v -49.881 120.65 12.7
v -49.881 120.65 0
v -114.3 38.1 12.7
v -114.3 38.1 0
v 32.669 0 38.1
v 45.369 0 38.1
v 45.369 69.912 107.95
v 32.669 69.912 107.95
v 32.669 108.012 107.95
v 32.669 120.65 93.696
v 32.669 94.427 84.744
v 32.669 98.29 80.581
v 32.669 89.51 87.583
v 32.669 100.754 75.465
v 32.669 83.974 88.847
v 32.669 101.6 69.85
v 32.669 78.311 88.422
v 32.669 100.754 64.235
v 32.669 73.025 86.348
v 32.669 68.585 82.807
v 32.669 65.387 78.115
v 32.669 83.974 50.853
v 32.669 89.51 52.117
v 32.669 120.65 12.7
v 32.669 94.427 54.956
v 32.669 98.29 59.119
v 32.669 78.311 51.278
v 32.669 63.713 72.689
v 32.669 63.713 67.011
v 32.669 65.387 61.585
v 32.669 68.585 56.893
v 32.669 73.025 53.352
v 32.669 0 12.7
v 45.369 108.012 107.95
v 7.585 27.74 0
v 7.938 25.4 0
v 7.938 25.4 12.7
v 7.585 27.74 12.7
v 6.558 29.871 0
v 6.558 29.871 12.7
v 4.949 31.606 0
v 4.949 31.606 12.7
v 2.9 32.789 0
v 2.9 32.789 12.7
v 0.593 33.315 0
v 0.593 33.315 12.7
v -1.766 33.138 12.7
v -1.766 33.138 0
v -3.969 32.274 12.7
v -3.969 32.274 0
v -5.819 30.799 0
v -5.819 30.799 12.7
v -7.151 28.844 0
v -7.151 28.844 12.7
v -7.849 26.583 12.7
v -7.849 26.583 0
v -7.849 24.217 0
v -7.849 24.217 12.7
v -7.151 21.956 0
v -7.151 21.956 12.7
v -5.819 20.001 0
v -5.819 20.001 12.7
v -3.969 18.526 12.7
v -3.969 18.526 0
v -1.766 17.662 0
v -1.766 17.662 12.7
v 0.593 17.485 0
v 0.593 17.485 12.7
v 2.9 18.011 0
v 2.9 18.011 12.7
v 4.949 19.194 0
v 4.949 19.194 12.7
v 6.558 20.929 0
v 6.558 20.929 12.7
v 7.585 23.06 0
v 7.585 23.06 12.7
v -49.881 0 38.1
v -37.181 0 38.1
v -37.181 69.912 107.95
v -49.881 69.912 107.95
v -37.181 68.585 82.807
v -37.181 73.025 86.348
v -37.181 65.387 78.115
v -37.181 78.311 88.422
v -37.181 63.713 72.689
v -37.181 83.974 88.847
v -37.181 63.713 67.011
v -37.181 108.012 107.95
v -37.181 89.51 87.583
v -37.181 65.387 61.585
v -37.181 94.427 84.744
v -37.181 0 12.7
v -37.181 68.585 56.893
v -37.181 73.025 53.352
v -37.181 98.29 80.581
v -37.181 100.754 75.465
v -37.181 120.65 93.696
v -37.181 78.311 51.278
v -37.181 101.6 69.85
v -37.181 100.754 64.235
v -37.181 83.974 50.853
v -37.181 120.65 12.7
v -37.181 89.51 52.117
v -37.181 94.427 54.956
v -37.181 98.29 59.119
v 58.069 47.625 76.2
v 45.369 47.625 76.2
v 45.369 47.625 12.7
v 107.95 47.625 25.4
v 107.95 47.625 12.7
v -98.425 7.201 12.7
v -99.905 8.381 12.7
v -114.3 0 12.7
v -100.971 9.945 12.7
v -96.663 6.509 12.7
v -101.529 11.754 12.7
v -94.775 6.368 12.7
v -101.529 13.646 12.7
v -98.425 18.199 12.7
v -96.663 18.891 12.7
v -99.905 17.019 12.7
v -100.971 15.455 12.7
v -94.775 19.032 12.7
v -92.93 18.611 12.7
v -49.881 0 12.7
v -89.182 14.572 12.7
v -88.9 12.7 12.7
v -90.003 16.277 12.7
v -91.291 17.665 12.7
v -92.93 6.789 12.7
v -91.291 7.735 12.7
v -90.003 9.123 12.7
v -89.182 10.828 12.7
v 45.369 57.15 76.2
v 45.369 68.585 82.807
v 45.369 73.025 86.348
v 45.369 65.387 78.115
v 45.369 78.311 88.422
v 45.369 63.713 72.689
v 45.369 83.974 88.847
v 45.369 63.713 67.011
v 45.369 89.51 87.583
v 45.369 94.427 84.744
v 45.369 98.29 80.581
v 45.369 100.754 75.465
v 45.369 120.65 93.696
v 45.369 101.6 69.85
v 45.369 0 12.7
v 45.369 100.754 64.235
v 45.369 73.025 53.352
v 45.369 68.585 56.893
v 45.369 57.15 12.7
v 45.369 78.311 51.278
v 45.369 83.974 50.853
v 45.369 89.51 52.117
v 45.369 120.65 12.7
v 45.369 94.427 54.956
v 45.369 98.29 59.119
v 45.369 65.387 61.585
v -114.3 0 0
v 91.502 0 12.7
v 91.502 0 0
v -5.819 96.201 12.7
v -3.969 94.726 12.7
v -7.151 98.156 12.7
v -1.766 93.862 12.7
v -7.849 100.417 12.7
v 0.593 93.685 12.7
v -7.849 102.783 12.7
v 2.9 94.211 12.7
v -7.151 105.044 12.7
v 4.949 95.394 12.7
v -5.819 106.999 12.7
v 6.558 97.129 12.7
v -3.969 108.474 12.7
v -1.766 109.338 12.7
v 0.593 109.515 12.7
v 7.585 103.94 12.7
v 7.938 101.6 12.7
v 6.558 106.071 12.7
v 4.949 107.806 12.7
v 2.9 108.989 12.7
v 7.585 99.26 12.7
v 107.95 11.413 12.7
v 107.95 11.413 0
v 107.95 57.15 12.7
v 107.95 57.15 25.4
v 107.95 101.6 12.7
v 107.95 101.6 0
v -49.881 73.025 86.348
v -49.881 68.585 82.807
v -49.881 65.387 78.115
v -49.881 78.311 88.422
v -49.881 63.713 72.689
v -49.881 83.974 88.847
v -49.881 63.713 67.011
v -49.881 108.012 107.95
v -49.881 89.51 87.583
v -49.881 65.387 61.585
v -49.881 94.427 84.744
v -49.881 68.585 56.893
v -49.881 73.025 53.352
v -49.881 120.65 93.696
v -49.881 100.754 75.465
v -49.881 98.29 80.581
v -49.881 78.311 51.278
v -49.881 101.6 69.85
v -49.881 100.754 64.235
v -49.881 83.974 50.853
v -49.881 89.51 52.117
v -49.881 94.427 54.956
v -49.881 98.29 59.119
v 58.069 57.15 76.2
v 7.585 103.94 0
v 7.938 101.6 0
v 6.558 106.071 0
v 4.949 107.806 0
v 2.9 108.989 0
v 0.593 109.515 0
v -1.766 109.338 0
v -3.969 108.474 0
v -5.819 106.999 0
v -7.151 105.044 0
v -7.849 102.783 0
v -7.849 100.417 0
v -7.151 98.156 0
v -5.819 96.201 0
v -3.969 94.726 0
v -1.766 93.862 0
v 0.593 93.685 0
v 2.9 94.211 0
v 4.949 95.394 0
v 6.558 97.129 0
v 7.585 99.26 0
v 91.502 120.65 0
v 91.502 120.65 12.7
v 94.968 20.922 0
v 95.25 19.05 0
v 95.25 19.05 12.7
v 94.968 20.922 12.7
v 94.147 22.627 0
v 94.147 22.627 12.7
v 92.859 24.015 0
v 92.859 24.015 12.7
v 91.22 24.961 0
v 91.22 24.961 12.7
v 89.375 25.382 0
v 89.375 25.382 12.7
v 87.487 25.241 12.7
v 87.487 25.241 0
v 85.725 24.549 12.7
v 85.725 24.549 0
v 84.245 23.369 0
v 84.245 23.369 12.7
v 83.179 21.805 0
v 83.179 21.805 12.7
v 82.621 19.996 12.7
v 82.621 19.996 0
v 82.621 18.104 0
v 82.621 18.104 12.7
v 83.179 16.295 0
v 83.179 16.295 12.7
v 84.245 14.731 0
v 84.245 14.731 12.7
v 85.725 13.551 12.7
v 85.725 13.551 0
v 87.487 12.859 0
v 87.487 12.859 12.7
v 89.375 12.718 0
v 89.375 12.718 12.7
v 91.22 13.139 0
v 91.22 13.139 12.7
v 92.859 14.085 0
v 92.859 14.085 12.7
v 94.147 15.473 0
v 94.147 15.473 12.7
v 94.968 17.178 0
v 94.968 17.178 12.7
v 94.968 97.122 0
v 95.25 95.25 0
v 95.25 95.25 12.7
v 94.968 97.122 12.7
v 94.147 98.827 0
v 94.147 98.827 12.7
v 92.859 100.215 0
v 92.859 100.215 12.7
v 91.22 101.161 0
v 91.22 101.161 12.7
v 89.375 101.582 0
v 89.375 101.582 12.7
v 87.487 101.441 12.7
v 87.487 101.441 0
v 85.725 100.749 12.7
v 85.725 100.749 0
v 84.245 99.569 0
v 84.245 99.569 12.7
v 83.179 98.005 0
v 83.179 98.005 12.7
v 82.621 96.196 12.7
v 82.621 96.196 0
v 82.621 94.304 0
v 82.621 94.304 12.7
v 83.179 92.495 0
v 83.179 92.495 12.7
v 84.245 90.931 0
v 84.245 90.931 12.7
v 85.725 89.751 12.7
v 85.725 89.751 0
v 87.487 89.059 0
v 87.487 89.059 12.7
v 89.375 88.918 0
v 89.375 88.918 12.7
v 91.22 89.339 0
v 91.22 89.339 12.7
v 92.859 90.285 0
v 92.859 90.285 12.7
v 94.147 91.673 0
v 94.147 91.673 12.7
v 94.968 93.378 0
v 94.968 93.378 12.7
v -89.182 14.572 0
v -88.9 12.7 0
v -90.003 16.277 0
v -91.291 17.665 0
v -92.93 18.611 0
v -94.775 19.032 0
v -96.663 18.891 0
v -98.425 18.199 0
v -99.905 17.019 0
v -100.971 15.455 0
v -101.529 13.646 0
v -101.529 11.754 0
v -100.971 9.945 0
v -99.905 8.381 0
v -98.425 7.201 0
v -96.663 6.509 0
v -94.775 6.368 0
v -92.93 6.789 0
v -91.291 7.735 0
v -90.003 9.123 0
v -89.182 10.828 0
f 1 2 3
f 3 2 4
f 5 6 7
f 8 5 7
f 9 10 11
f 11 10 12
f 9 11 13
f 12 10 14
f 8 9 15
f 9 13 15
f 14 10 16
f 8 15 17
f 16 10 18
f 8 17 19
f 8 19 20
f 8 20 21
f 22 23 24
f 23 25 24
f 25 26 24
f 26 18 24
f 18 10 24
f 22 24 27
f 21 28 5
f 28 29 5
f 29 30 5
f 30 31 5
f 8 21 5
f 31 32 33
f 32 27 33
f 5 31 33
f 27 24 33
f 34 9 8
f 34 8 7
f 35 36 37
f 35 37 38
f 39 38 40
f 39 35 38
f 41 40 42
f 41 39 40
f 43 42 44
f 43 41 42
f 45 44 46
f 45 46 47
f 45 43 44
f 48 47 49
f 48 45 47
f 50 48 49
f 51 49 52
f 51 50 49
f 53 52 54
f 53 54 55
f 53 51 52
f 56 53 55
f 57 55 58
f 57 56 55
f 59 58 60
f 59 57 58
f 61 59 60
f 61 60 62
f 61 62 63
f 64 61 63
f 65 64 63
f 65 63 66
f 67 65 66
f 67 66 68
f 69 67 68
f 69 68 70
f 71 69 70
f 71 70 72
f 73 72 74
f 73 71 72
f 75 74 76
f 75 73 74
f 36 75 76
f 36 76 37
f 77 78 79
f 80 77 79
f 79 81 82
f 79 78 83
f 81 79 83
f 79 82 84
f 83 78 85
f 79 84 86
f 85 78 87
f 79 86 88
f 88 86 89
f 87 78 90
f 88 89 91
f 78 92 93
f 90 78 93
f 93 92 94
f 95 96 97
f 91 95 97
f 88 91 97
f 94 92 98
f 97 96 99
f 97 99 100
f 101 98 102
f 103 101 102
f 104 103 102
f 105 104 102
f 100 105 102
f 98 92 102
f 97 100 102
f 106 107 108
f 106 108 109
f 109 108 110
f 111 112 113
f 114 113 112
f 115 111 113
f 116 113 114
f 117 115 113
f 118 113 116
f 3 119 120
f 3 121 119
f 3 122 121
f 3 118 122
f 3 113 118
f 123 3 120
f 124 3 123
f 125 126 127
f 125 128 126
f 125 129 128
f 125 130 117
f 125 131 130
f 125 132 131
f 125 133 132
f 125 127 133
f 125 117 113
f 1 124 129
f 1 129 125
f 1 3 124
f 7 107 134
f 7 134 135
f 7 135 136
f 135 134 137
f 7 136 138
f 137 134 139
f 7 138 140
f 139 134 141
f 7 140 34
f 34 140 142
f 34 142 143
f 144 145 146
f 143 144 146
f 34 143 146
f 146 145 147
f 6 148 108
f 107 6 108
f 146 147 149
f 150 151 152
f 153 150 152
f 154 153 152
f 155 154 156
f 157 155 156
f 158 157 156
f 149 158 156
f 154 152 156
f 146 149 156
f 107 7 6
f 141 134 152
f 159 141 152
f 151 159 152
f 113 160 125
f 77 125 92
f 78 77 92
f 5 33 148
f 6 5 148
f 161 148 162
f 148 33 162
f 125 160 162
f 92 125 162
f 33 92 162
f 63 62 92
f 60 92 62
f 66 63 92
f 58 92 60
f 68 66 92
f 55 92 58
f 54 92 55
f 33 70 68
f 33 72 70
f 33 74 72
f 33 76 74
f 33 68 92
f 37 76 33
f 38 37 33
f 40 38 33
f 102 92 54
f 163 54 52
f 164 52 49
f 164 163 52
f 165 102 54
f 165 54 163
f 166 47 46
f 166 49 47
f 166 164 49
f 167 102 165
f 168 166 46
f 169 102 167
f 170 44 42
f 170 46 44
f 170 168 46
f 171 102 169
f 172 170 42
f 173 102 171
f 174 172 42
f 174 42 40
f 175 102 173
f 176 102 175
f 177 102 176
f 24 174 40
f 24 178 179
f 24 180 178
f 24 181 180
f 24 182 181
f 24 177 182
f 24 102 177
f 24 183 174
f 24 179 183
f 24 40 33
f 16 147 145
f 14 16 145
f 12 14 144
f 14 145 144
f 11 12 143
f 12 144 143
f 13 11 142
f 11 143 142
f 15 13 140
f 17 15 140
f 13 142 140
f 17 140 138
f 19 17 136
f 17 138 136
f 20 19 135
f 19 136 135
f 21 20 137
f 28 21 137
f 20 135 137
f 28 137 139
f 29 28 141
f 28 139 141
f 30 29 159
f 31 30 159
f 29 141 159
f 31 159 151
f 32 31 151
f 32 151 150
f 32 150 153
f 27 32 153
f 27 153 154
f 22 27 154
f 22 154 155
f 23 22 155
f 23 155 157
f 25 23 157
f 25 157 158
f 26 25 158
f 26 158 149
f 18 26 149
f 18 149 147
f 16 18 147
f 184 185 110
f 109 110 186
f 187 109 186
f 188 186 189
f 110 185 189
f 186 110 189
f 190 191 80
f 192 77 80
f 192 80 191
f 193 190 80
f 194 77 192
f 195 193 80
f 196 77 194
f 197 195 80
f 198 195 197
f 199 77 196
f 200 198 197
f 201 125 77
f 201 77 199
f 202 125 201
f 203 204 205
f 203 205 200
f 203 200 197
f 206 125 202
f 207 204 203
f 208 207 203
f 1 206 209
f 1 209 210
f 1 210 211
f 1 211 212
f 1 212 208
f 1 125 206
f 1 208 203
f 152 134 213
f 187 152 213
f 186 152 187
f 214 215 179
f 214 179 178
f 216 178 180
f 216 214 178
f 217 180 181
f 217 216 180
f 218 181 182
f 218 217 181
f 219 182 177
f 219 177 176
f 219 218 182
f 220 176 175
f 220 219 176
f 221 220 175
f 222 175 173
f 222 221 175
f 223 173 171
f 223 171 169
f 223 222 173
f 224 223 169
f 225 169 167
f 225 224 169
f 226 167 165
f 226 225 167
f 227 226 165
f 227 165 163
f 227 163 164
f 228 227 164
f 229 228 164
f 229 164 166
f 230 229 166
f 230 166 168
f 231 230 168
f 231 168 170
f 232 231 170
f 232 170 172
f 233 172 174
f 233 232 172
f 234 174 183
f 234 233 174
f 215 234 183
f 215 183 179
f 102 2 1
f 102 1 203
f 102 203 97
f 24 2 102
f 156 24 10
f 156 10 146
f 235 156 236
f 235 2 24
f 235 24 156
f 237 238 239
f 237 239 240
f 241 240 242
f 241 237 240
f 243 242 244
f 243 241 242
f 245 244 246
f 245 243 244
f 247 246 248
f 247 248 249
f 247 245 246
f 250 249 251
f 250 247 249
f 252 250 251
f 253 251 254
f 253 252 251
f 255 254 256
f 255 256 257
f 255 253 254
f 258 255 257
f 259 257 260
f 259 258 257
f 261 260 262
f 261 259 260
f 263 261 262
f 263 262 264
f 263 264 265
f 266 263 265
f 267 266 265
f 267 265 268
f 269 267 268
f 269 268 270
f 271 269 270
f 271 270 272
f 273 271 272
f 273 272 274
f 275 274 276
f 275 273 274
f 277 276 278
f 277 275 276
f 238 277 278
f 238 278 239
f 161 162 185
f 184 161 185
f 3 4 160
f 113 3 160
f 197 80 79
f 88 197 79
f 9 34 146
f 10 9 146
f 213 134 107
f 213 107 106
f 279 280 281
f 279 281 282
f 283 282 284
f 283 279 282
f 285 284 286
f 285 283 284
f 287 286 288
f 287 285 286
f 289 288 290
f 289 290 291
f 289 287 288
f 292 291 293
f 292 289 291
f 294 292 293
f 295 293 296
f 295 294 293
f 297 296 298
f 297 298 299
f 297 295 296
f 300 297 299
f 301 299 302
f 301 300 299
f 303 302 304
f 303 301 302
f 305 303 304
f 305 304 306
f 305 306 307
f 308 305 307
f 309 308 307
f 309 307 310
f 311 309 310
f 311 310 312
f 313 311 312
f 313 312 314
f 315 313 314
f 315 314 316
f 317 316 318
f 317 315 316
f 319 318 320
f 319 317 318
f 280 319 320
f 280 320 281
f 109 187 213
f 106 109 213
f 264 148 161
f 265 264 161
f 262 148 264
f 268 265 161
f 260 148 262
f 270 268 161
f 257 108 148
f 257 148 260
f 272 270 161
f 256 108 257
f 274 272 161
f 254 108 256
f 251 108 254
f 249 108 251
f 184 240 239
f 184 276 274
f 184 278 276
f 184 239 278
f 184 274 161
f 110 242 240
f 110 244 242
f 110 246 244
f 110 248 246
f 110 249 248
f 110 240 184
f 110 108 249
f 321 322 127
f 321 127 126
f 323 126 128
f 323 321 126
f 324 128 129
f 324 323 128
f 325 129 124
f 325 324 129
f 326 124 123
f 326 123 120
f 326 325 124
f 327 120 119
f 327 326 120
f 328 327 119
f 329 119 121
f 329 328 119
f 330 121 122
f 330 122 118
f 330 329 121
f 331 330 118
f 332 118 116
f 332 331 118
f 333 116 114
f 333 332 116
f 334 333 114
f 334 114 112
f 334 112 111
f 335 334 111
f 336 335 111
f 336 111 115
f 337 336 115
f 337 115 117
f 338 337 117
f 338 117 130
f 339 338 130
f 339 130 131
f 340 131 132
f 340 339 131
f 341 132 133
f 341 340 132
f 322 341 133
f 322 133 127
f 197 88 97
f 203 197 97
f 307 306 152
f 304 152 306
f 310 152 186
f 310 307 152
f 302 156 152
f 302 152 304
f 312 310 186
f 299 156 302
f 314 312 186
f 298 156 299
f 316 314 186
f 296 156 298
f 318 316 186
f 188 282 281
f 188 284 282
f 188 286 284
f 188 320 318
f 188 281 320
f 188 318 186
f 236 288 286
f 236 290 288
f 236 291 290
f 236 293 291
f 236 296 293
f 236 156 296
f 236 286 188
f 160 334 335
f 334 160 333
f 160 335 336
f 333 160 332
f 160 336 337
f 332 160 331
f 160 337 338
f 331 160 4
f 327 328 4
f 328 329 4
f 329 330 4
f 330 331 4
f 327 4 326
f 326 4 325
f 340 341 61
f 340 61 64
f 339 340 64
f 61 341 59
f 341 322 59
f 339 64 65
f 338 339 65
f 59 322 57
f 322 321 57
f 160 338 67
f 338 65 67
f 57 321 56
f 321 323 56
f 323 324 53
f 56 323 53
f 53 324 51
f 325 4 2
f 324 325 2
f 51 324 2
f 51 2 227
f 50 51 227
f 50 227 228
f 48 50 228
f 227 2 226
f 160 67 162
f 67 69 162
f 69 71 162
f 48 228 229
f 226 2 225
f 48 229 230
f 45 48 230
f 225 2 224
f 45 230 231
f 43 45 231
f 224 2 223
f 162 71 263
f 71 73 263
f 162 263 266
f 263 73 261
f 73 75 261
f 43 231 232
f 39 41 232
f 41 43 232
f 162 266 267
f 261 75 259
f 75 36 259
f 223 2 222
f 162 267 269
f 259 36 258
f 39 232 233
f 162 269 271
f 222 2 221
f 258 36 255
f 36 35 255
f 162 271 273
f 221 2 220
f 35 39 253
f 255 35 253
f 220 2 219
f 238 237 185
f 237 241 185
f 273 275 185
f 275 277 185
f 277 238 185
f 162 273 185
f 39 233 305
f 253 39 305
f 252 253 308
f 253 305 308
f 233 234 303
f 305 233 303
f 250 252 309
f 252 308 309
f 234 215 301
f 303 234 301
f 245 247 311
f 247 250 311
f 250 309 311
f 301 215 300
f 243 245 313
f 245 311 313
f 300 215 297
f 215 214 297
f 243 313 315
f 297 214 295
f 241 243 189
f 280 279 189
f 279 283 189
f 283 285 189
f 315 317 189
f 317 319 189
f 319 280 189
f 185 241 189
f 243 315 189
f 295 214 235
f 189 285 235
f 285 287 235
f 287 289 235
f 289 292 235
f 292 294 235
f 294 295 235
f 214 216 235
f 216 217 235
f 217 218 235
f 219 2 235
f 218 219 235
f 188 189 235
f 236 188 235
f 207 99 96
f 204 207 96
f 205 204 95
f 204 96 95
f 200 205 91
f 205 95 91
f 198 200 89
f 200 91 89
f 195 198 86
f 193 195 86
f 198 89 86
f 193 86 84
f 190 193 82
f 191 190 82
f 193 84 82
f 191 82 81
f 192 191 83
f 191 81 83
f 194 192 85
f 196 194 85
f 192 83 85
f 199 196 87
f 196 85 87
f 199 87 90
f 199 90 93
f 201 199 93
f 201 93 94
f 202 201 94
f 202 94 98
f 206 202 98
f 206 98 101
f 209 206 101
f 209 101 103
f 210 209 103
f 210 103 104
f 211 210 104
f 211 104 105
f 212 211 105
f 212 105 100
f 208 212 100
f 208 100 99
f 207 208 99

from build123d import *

# Parameters (mm, degrees)
F0_R     = 6.35
F1_DEPTH = 12.7
F0_W     = 69.85
F0_H     = 120.65
F0_R_2   = 7.9375
F0_W_2   = 12.7
F2_DEPTH = 107.95
F0_W_3   = 62.5805897668
F0_H_2   = 9.525
F3_DEPTH = 76.2
F5_DEPTH = 25.4
F6_R     = 19.05
F7_DEPTH = 159.6704102332


with BuildPart() as f1:
    # F0 (on Top) → F1 (new body)
    with BuildSketch(Plane.XY):
        Polygon((91.5022938823, 120.65), (45.3694102332, 120.65), (45.3694102332, 57.15), (107.95, 57.15), (107.95, 101.6), align=None)
        with Locations((88.9, 95.25)):
            Circle(F0_R, mode=Mode.SUBTRACT)
    extrude(amount=F1_DEPTH)



with BuildPart() as f1b:
    # F0 (on Top) → F1, piece 2 (new body)
    with BuildSketch(Plane.XY):
        Polygon((45.3694102332, 47.625), (45.3694102332, 0), (91.5022938823, 0), (107.95, 11.4125879677), (107.95, 47.625), align=None)
        with Locations((88.9, 19.05)):
            Circle(F0_R, mode=Mode.SUBTRACT)
    extrude(amount=F1_DEPTH)


with BuildPart() as f1c:
    # F0 (on Top) → F1, piece 3 (new body)
    with BuildSketch(Plane.XY):
        with Locations((-2.2555897668, 60.325)):
            Rectangle(F0_W, F0_H)
        with Locations((0, 25.4)):
            Circle(F0_R_2, mode=Mode.SUBTRACT)
        with Locations((0, 101.6)):
            Circle(F0_R_2, mode=Mode.SUBTRACT)
    extrude(amount=F1_DEPTH)


with BuildPart() as f1d:
    # F0 (on Top) → F1, piece 4 (new body)
    with BuildSketch(Plane.XY):
        Polygon((-114.3, 0), (-91.3736136669, 0), (-49.8805897668, 0), (-49.8805897668, 120.65), (-114.3, 38.1), align=None)
        with Locations((-95.25, 12.7)):
            Circle(F0_R, mode=Mode.SUBTRACT)
    extrude(amount=F1_DEPTH)


with BuildPart() as f1_1:
    add(f1.part)

    add(f1b.part)  # F2 merges F1b

    add(f1c.part)  # F2 merges F1c

    add(f1d.part)  # F2 merges F1d
    # F0 (on Top) → F2 (join)
    with BuildSketch(Plane.XY):
        with Locations((-43.5305897668, 60.325)):
            Rectangle(F0_W_2, F0_H)
        Polygon((32.6694102332, 120.65), (32.6694102332, 0), (45.3694102332, 0), (45.3694102332, 47.625), (45.3694102332, 57.15), (45.3694102332, 120.65), align=None)
    extrude(amount=F2_DEPTH)

    # F0 (on Top) → F3 (join)
    with BuildSketch(Plane.XY):
        with Locations((76.6597051166, 52.3875)):
            Rectangle(F0_W_3, F0_H_2)
    extrude(amount=F3_DEPTH)

    # F4 (on face) → F5 (cut)
    with BuildSketch(Plane(origin=(0, 57.15, 0), x_dir=(-1, 0, 0), z_dir=(0, 1, 0))):
        Polygon((-107.95, 76.2), (-107.95, 25.4), (-58.0694102332, 76.2), align=None)
    extrude(amount=-F5_DEPTH, mode=Mode.SUBTRACT)

    # F6 (on face) → F7 (cut, through all)
    with BuildSketch(Plane.YZ.offset(45.3694102332)):
        Polygon((0, 107.95), (0, 38.1), (69.9122603316, 107.95), align=None)
        Polygon((120.65, 107.95), (108.0122603316, 107.95), (120.65, 93.6955257524), align=None)
        with Locations((82.55, 69.85)):
            Circle(F6_R)
    extrude(amount=-F7_DEPTH, mode=Mode.SUBTRACT)


solid = f1_1.part
